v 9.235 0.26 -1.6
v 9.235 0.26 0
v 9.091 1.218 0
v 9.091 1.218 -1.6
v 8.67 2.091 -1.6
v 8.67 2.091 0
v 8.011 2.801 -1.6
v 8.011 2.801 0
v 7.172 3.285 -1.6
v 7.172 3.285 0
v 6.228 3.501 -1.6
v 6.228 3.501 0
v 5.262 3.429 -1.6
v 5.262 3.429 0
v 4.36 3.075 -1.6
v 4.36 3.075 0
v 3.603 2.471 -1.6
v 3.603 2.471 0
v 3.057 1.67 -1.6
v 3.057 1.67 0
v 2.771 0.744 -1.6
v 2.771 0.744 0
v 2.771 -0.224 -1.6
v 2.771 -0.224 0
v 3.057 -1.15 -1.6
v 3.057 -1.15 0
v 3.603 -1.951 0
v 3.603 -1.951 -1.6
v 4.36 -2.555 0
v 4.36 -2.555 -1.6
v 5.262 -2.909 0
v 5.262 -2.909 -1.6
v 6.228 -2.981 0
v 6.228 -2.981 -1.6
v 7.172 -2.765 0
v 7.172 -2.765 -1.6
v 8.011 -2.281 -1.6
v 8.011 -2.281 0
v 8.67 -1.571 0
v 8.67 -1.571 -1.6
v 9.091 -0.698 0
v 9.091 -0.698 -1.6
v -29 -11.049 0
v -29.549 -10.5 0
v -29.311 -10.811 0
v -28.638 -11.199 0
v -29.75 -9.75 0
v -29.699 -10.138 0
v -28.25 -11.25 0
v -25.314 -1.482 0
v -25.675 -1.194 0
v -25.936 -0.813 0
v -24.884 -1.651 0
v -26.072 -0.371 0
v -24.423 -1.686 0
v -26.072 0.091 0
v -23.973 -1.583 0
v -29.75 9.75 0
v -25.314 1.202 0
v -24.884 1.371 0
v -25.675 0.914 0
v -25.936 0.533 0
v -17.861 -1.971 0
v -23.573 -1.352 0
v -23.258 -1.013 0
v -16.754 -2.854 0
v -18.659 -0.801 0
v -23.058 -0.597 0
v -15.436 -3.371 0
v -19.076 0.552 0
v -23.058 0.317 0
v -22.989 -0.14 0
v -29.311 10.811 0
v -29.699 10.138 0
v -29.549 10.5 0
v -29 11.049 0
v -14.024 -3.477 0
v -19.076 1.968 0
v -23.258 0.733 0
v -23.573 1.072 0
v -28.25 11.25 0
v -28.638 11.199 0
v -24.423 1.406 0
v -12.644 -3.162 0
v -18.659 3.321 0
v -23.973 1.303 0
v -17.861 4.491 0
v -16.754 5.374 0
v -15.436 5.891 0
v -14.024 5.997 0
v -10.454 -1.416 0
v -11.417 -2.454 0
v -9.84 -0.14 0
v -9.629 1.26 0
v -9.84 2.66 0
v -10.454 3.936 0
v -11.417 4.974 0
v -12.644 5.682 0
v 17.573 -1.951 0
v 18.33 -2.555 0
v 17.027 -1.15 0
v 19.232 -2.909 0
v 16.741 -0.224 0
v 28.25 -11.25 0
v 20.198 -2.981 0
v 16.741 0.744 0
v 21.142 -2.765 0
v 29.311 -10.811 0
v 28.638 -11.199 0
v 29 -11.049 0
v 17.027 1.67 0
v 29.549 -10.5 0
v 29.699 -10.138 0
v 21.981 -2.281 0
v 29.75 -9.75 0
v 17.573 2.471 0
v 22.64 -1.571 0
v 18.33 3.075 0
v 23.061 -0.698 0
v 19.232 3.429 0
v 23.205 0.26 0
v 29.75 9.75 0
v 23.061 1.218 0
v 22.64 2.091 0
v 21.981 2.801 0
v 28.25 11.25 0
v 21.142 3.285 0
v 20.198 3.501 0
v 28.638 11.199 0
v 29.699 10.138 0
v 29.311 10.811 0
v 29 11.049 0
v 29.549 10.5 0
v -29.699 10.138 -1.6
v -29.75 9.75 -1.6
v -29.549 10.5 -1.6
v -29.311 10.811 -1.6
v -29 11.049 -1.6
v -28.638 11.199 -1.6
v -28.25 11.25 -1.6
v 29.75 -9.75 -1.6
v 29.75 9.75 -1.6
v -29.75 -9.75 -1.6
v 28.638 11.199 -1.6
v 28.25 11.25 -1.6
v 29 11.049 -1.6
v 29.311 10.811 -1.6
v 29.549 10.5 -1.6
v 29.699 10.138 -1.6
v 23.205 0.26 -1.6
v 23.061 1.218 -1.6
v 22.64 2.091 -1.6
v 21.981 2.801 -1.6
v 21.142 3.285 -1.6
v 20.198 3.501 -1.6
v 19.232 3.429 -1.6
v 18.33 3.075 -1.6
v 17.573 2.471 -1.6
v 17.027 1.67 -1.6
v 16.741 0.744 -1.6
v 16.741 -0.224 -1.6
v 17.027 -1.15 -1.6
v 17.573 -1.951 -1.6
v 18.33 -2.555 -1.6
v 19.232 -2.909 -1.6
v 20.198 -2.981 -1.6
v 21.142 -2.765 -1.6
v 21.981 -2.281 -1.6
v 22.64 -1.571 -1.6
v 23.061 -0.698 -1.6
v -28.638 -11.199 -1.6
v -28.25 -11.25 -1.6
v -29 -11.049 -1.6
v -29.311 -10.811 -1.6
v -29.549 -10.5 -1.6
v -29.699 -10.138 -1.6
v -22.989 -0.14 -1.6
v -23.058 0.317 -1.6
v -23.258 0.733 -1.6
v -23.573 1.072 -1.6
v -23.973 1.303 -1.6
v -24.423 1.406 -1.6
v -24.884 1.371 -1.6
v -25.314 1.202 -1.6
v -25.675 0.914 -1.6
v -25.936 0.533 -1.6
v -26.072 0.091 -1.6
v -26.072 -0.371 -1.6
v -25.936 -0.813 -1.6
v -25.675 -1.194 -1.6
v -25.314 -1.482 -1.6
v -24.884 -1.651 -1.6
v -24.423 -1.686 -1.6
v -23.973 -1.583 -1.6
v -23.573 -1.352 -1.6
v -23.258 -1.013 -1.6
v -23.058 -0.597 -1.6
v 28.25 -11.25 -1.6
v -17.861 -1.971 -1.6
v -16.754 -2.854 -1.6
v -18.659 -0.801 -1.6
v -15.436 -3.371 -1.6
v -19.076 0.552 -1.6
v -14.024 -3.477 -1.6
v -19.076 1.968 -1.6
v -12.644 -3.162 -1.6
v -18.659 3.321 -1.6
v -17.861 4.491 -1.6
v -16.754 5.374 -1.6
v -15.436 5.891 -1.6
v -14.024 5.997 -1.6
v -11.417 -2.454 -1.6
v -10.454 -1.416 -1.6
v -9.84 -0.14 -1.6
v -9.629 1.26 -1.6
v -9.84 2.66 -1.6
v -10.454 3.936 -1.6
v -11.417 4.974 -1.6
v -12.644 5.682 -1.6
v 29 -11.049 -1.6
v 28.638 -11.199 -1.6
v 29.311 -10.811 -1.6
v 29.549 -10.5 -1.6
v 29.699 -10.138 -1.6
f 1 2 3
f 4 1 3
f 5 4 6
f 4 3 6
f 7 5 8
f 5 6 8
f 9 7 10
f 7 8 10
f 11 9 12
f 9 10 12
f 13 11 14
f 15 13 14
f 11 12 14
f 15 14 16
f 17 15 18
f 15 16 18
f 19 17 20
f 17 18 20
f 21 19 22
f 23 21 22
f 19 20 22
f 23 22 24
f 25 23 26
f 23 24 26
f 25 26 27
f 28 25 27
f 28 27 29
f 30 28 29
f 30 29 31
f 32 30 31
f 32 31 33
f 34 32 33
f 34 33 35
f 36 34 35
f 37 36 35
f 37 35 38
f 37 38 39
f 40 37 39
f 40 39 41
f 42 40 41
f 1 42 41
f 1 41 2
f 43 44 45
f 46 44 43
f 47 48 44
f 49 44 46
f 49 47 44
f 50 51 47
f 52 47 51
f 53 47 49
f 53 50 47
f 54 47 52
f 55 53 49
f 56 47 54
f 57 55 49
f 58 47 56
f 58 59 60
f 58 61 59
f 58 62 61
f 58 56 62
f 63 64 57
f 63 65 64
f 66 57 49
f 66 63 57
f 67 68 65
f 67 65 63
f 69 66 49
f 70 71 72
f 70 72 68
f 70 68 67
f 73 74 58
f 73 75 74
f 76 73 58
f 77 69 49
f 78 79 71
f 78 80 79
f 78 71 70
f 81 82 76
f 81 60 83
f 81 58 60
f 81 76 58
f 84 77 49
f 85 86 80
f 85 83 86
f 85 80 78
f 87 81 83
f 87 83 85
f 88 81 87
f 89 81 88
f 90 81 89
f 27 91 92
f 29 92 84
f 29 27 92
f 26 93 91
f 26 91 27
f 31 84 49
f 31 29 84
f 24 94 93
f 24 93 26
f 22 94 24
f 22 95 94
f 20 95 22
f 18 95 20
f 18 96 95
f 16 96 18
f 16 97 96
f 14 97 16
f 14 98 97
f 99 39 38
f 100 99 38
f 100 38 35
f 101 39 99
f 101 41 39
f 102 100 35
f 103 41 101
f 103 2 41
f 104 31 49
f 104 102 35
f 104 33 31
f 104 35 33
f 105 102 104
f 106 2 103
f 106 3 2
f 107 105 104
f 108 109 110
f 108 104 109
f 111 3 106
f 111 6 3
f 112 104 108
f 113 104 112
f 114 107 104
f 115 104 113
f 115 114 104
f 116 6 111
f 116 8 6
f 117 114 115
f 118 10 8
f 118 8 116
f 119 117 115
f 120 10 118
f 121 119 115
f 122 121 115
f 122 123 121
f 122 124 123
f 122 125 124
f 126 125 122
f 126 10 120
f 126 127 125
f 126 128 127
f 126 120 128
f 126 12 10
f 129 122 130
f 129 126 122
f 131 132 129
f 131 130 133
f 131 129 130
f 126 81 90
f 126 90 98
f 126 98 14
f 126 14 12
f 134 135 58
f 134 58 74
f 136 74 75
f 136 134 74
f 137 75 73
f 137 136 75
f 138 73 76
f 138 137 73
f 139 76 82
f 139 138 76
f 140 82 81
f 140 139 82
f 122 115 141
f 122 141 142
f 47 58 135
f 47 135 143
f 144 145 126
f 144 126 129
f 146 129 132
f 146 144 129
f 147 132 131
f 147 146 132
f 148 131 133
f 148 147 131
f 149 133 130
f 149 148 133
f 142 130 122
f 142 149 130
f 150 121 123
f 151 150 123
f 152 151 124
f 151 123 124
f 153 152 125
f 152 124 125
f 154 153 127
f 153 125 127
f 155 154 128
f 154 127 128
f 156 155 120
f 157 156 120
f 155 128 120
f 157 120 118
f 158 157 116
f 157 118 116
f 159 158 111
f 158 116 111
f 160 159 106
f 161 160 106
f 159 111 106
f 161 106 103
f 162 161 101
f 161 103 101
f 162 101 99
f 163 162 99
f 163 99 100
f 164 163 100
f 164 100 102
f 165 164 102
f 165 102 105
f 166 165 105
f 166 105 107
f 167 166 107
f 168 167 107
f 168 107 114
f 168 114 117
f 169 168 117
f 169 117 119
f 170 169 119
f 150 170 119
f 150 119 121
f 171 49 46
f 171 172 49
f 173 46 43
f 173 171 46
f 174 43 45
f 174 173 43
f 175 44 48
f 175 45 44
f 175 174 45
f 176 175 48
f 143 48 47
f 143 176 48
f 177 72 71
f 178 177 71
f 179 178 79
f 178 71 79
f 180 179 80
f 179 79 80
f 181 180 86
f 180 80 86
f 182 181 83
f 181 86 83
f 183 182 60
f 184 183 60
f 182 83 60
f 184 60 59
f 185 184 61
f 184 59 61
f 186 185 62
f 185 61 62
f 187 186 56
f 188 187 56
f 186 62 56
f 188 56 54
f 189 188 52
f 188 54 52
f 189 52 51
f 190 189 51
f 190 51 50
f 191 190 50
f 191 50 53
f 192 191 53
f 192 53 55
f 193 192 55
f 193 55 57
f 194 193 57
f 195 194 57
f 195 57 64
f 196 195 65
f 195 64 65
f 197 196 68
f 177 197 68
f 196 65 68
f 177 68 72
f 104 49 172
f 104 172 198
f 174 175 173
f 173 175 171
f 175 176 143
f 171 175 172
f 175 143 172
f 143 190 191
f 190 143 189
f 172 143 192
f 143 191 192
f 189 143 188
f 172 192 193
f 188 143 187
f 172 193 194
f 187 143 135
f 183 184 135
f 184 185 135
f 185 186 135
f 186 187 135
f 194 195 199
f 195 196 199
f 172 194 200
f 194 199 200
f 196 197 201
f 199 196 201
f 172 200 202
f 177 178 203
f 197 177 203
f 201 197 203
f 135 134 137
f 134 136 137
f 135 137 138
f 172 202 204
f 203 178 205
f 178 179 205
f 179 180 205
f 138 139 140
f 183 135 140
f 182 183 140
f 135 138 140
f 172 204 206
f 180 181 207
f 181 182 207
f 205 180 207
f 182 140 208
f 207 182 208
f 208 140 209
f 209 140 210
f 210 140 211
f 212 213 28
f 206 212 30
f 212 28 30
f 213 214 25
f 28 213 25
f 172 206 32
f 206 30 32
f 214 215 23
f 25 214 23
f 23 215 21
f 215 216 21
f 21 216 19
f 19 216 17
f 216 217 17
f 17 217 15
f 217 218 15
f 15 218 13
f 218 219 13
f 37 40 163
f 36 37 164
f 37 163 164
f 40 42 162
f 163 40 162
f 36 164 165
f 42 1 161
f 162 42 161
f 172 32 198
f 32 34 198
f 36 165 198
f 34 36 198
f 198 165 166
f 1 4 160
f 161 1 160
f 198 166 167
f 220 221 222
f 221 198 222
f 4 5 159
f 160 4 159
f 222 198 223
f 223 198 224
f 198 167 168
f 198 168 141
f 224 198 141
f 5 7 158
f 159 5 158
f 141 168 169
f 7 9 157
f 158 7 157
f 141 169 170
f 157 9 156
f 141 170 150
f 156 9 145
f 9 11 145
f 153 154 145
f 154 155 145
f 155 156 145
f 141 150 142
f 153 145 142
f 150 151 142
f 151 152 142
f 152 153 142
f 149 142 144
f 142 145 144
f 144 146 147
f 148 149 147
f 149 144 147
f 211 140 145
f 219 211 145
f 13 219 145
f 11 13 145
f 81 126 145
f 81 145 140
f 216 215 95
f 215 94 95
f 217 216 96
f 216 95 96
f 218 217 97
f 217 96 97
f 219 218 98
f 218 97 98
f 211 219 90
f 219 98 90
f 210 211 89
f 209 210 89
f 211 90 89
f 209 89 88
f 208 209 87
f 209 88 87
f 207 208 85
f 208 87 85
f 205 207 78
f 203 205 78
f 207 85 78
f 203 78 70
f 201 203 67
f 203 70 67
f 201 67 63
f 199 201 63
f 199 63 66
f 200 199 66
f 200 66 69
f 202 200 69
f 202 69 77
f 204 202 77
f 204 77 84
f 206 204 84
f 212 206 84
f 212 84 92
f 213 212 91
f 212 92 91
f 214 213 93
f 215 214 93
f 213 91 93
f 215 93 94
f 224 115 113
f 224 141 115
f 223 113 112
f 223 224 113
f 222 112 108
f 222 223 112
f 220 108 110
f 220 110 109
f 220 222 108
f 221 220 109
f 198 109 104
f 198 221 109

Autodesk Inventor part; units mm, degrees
ref_plane "YZ Plane" through (0, 0, 0) normal (1, 0, 0) x (0, 1, 0)
ref_plane "XZ Plane" through (0, 0, 0) normal (0, 1, 0) x (-1, 0, 0)
ref_plane "XY Plane" through (0, 0, 0) normal (0, 0, 1) x (1, 0, 0)
sketch "Sketch1" plane through (0, 0, 0) normal (0, 0, 1) x (1, 0, 0)
  line L0 (-29.75, -11.25) -> (29.75, -11.25)
  line L1 (29.75, -11.25) -> (29.75, 11.25)
  line L2 (29.75, 11.25) -> (-29.75, 11.25)
  line L3 (-29.75, 11.25) -> (-29.75, -11.25)
  line L4 (-29.75, -11.25) -> (29.75, 11.25) construction
  line L5 (29.75, -11.25) -> (-29.75, 11.25) construction
  point P0 (0, 0)
  dimension "d0" = 59.5
  dimension "d1" = 22.5
extrude "Extrusion1" add sketch "Sketch1" against normal blind 1.6
fillet "Fillet1" radius 1.5 4 edges at (29.75, 11.25, -0.8) (29.75, -11.25, -0.8) (-29.75, 11.25, -0.8) (-29.75, -11.25, -0.8)
sketch "Sketch2" plane through (0, 0, 0) normal (0, 0, 1) x (1, 0, 0)
  circle A0 centre (-14.379, 1.26) radius 4.75
  line L0 (-28.25, -11.25) -> (28.25, -11.25) projected
  line L1 (-29.75, 9.75) -> (-29.75, -9.75) projected
  point P0 (0, 0)
  dimension "d5" = 9.5
  dimension "d15" = 12.51
  dimension "d16" = 15.371
extrude "Extrusion2" cut sketch "Sketch2" against normal through all
sketch "Sketch3" plane through (0, 0, 0) normal (0, 0, 1) x (1, 0, 0)
  line L0 (-28.25, -11.25) -> (28.25, -11.25) projected
  circle A0 centre (5.985, 0.26) radius 3.25
  circle A1 centre (19.955, 0.26) radius 3.25
  point P0 (0, 0)
  dimension "d8" = 6.5
  dimension "d9" = 13.97
  dimension "d10" = 11.51
  dimension "d11" = 5.985
  dimension "d14" = 11.51
extrude "Extrusion3" cut sketch "Sketch3" against normal through all
sketch "Sketch4" plane through (0, 0, 0) normal (0, 0, 1) x (1, 0, 0)
  line L0 (-28.25, -11.25) -> (28.25, -11.25) projected
  line L1 (-29.75, 9.75) -> (-29.75, -9.75) projected
  circle A0 centre (-24.539, -0.14) radius 1.55
  point P0 (0, 0)
  point P1 (-28.349, -5.24)
  dimension "d17" = 6.01
  dimension "d18" = 1.401
  dimension "d19" = 3.1
  dimension "d20" = 3.81
  dimension "d21" = 5.1
extrude "Extrusion4" cut sketch "Sketch4" against normal through all
sketch "Sketch5" plane through (0, 0, 0) normal (0, 0, 1) x (1, 0, 0)
  line L0 (-29.75, 11.25) -> (29.75, 11.25) construction
  line L1 (29.75, 11.25) -> (29.75, -11.2473) construction
  line L2 (29.75, -11.2473) -> (-29.75, -11.2473) construction
  line L3 (-29.75, -11.2473) -> (-29.75, 11.25) construction
  line L4 (28.25, 11.25) -> (-28.25, 11.25) projected
  line L5 (-29.75, 9.75) -> (-29.75, -9.75) projected
  line L6 (29.75, -9.75) -> (29.75, 9.75) projected
  point P0 (0, 0)
decal "Decal1"
equation "\"d14\" = d10"
properties part number "frontPlate"
